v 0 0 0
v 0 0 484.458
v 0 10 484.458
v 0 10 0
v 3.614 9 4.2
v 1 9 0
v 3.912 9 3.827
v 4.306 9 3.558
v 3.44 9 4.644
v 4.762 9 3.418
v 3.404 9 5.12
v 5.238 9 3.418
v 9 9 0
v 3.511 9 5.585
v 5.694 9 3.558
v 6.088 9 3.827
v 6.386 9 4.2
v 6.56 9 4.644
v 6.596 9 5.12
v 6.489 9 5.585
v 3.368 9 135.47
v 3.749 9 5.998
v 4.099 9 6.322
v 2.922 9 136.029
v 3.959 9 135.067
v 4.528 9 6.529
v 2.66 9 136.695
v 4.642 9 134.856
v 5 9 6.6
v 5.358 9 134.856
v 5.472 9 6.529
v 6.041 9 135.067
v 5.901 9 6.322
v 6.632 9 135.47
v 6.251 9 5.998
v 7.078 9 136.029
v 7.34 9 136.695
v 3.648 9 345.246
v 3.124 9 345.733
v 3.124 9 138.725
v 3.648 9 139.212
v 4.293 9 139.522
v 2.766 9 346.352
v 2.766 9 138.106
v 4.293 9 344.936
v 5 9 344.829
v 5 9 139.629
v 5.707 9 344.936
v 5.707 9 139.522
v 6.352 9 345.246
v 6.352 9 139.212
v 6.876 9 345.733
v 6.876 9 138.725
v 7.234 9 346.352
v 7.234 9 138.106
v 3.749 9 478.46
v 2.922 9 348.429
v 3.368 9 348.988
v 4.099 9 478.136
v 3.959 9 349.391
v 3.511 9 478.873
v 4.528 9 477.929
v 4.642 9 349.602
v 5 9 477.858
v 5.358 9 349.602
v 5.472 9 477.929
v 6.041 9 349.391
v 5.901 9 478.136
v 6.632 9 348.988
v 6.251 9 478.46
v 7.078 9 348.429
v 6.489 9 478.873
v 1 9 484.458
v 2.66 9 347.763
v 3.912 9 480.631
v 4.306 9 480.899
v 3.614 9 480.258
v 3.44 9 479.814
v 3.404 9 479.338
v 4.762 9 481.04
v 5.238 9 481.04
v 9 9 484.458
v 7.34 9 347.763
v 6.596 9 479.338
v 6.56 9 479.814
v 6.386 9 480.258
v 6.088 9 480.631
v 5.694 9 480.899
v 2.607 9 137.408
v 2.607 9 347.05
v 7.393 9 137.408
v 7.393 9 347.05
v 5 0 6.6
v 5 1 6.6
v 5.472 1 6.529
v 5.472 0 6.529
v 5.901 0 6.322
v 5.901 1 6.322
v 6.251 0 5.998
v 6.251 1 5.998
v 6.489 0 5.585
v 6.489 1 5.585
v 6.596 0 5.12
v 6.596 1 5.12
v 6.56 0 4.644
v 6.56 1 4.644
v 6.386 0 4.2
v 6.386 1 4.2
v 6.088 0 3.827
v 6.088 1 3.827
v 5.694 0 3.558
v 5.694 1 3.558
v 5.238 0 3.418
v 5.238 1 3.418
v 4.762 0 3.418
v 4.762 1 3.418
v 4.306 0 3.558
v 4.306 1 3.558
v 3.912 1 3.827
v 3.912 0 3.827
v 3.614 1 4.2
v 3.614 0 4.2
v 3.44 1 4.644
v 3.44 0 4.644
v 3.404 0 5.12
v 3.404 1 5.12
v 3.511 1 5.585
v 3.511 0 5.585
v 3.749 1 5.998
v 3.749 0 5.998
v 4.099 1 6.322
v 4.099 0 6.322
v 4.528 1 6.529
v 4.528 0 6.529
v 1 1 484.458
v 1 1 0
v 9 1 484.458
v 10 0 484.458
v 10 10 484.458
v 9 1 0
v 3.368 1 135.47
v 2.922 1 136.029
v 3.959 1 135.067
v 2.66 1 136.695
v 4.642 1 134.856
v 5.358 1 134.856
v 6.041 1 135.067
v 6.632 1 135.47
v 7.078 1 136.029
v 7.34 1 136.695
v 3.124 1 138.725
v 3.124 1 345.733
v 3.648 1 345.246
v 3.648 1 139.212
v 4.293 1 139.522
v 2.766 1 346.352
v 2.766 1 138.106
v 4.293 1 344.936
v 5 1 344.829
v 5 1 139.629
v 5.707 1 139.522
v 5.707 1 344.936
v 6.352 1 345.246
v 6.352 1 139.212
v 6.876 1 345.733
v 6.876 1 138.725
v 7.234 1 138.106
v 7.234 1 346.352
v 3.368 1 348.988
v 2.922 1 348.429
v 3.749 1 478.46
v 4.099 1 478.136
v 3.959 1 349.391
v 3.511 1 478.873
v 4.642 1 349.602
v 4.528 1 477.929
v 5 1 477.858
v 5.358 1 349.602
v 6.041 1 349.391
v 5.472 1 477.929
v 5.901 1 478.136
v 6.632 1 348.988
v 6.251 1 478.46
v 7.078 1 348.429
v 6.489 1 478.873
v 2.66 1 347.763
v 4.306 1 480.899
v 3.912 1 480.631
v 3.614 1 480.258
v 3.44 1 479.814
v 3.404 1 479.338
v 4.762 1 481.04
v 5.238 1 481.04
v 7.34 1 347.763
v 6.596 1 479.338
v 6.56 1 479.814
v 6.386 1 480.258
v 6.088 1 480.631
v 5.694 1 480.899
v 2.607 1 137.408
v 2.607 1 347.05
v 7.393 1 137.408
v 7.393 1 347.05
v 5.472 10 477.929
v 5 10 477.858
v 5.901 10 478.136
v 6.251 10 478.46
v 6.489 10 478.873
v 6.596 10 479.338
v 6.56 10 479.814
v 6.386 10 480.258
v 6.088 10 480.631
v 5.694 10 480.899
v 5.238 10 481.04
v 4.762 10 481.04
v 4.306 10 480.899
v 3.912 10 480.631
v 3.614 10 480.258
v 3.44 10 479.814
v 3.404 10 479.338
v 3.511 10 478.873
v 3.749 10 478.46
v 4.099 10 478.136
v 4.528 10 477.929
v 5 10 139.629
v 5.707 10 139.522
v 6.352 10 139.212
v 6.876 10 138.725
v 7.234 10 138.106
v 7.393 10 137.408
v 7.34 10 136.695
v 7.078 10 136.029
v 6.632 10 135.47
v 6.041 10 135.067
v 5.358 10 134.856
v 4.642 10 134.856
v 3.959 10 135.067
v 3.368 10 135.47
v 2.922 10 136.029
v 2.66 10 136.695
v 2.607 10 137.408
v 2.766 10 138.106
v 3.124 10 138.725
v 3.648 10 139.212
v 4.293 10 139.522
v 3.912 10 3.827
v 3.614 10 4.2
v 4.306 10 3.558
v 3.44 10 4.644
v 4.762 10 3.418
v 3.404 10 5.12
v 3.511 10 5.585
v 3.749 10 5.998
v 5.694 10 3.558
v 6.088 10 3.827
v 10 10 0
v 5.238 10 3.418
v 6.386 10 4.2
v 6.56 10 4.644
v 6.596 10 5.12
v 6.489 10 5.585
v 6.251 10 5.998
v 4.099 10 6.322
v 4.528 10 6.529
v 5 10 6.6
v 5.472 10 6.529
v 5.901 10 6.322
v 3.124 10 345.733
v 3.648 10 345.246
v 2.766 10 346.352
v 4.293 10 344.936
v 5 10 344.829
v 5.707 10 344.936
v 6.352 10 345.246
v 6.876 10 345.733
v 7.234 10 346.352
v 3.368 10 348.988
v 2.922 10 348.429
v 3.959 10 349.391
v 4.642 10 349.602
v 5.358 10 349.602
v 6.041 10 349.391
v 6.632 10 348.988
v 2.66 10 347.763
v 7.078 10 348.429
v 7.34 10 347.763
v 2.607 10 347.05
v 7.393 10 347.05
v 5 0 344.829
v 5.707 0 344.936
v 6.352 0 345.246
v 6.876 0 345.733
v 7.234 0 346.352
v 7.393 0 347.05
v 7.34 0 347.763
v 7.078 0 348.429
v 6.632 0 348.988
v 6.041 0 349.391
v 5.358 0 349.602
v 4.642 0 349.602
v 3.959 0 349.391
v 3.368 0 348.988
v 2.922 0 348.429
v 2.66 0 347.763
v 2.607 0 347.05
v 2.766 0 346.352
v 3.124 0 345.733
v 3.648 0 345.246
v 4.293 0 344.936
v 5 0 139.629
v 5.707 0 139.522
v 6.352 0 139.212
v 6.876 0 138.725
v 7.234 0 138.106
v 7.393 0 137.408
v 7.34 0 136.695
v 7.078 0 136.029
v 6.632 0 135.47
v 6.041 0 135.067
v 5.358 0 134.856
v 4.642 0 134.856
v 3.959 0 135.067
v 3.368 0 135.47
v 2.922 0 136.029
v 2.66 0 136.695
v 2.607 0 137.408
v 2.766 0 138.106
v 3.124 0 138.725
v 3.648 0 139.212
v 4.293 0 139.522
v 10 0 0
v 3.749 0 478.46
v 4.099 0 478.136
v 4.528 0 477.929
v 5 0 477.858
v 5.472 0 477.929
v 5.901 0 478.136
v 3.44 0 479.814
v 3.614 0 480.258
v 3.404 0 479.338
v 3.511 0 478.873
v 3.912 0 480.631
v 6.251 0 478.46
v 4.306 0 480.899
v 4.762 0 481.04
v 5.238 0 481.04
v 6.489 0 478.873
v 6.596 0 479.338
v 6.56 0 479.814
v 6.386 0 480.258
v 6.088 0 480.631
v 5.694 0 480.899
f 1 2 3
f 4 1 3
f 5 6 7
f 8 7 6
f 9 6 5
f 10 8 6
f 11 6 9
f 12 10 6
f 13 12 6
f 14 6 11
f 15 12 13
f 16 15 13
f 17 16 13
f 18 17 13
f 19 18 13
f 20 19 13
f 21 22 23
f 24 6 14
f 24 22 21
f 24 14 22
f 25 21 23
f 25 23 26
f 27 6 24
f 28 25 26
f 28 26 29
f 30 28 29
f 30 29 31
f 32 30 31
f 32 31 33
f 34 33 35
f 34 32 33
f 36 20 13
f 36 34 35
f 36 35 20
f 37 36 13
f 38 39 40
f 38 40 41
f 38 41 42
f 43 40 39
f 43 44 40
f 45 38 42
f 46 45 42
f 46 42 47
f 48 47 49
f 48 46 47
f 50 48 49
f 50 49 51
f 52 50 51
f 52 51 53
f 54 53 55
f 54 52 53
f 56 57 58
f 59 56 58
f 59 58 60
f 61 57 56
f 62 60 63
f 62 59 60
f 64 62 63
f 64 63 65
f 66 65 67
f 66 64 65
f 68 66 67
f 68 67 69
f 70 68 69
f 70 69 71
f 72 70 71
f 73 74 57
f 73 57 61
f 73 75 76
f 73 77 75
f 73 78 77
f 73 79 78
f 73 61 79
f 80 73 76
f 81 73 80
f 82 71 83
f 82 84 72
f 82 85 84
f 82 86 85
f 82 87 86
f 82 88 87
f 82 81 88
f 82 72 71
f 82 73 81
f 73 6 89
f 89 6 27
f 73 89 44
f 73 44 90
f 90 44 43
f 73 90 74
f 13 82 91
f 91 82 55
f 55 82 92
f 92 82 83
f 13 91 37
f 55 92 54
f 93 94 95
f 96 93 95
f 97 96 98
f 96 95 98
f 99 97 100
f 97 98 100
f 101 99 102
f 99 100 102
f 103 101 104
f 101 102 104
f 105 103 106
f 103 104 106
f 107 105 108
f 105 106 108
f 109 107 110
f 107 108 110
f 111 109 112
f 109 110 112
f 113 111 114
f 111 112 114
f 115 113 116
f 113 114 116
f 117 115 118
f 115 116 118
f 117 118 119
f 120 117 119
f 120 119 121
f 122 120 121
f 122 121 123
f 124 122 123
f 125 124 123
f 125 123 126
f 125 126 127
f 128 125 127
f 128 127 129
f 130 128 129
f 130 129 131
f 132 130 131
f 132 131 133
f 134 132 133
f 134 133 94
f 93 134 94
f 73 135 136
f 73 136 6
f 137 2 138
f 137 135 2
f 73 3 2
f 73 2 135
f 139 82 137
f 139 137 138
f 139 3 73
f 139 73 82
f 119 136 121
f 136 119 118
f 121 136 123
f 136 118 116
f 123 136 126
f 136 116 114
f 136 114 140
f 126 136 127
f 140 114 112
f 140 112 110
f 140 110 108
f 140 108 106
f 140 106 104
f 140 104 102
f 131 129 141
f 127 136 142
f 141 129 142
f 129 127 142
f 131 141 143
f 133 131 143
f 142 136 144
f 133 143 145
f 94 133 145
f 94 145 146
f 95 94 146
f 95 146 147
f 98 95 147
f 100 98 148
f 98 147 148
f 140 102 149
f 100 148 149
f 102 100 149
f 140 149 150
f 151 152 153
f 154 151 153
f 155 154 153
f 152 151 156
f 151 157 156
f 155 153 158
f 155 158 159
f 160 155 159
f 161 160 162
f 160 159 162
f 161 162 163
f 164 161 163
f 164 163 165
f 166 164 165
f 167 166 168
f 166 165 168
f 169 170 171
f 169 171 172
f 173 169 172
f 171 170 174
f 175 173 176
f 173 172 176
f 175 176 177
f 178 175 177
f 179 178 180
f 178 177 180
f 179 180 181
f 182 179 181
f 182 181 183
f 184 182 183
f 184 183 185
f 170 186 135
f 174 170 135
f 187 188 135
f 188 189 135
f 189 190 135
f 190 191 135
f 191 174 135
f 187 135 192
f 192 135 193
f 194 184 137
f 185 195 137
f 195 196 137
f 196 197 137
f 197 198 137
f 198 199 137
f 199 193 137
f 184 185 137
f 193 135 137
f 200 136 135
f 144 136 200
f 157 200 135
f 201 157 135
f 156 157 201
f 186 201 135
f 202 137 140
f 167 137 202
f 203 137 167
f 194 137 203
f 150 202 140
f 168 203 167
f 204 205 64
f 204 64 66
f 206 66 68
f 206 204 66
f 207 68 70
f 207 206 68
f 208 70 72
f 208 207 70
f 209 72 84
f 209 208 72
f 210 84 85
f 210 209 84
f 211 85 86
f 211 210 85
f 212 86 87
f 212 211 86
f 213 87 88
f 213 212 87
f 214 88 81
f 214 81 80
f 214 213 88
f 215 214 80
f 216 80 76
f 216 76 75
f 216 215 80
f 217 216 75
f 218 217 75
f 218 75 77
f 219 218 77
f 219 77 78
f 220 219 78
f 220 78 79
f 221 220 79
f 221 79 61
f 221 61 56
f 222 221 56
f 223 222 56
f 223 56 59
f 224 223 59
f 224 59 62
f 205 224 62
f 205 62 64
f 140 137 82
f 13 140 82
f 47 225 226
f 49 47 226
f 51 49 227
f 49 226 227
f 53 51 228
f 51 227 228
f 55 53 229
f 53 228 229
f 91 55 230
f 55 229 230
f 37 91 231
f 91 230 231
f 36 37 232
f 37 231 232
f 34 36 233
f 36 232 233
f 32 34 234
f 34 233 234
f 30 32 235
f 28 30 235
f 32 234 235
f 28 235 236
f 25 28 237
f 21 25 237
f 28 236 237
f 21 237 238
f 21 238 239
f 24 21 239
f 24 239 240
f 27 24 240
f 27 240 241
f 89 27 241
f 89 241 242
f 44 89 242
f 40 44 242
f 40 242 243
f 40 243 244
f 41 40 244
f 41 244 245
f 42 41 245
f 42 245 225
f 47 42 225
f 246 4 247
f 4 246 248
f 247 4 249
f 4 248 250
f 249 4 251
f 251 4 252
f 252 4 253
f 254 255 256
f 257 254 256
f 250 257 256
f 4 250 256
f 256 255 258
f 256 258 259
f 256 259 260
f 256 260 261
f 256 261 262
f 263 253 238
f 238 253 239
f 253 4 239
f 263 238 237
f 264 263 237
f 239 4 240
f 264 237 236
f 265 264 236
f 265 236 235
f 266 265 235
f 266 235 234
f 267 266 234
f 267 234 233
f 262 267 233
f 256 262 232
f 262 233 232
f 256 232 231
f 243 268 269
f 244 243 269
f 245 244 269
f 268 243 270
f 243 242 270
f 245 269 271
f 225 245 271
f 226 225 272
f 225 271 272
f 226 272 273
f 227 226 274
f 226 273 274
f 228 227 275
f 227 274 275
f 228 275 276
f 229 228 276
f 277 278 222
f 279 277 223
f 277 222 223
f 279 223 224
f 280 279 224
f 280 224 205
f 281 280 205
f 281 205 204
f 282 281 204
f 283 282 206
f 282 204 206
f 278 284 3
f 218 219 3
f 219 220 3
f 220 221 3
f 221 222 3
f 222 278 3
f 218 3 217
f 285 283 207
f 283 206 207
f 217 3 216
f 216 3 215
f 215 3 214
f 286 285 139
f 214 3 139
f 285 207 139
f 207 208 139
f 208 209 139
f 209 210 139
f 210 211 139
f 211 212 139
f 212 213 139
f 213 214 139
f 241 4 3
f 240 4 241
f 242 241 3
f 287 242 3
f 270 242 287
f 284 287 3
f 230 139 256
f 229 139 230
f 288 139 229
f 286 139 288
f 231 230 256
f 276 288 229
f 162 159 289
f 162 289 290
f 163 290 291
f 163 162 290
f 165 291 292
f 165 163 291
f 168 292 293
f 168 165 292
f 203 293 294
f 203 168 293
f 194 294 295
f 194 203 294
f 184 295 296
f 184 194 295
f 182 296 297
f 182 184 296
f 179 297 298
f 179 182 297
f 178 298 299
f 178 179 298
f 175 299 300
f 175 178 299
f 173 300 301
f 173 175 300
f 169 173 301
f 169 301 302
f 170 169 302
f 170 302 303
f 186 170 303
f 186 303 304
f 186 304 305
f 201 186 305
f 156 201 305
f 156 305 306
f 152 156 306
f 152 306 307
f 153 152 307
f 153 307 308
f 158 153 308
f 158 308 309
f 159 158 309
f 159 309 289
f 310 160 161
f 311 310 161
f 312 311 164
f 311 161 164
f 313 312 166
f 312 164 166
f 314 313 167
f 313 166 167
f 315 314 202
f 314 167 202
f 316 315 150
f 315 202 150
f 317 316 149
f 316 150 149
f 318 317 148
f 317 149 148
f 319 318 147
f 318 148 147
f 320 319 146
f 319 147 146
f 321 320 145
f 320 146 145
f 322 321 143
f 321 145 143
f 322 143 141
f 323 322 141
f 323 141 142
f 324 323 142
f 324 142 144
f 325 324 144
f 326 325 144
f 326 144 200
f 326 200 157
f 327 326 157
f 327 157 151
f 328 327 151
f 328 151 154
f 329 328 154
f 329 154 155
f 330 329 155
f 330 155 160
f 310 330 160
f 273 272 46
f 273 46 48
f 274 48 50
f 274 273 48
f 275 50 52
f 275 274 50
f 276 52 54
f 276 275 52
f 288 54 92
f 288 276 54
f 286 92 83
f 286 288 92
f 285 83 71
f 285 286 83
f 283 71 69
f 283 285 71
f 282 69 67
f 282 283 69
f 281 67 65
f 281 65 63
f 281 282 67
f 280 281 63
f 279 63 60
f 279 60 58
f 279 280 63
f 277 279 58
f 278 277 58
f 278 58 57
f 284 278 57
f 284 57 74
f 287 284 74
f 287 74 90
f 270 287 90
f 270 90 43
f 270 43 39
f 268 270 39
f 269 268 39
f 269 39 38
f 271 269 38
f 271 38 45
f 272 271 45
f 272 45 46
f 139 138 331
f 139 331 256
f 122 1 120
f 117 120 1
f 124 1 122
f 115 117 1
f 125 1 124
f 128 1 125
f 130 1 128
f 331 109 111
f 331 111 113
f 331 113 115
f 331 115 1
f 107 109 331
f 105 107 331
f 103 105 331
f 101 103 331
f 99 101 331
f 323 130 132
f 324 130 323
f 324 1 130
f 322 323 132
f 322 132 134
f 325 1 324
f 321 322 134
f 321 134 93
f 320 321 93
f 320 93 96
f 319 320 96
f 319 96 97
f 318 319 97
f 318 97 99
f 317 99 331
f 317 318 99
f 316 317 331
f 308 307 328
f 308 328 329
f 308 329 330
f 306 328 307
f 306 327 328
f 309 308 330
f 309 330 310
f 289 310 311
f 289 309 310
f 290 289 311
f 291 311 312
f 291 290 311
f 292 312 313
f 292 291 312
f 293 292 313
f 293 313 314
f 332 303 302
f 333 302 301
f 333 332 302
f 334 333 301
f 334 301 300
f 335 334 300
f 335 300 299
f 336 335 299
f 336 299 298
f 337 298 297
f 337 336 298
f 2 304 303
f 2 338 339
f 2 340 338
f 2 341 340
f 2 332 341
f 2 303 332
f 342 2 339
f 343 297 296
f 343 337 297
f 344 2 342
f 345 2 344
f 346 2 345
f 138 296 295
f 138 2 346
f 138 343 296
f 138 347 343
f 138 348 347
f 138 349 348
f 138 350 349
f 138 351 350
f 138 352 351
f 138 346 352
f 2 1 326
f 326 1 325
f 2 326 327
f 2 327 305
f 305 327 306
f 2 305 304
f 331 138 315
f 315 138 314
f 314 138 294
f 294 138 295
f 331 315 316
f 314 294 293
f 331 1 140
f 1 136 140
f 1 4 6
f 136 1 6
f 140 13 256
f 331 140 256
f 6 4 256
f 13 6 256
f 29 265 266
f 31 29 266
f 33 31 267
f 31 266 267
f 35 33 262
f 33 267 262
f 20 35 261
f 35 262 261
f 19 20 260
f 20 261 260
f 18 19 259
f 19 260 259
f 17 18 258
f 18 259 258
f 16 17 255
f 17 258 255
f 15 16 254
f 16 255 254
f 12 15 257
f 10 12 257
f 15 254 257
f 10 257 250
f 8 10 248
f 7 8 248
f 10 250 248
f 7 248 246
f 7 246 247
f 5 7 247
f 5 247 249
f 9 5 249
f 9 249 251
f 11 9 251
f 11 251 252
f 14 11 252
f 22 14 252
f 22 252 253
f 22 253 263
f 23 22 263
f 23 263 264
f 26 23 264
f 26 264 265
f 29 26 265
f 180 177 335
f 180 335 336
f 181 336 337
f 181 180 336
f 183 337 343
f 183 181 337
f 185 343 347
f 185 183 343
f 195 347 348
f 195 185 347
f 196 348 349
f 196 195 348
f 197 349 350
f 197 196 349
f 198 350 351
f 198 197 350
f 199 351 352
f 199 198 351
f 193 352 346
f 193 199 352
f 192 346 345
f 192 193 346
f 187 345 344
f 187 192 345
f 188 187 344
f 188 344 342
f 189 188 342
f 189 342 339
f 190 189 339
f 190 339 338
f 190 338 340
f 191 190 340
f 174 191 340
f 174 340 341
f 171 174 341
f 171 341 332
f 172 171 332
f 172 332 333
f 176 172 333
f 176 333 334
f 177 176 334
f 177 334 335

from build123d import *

# Parameters (mm, degrees)
SKETCH_1_W          = 10
SKETCH_1_H          = 10
SKETCH_1_W_2        = 8
SKETCH_1_H_2        = 8
EXTRUDE_1_DEPTH     = 242.228968082
SKETCH_2_R          = 2.4
SKETCH_2_R_2        = 1.6
CUT_EXTRUDE_1_DEPTH = 243.641449423


with BuildPart() as part:
    # ｽｹｯﾁ1 → ﾎﾞｽ - 押し出し1 (new body)
    with BuildSketch(Plane.XY):
        with Locations((5, 5)):
            Rectangle(SKETCH_1_W, SKETCH_1_H)
        with Locations((5, 5)):
            Rectangle(SKETCH_1_W_2, SKETCH_1_H_2, mode=Mode.SUBTRACT)
    extrude(amount=EXTRUDE_1_DEPTH)

    # ｽｹｯﾁ2 → ｶｯﾄ - 押し出し1 (cut, through all)
    with BuildSketch(Plane(origin=(0, 10, 0), x_dir=(1, 0, 0), z_dir=(0, 1, 0))):
        with Locations((5, -137.228968082)):
            Circle(SKETCH_2_R)
        with Locations((5, -5)):
            Circle(SKETCH_2_R_2)
    extrude(amount=-CUT_EXTRUDE_1_DEPTH, mode=Mode.SUBTRACT)

    # ﾐﾗｰ1: part across plane


with BuildPart() as part_1:
    add(part.part)
    add(part.part.mirror(Plane(origin=(0, 0, 242.228968082), x_dir=(1, 0, 0), z_dir=(0, 0, -1))))


solid = part_1.part
